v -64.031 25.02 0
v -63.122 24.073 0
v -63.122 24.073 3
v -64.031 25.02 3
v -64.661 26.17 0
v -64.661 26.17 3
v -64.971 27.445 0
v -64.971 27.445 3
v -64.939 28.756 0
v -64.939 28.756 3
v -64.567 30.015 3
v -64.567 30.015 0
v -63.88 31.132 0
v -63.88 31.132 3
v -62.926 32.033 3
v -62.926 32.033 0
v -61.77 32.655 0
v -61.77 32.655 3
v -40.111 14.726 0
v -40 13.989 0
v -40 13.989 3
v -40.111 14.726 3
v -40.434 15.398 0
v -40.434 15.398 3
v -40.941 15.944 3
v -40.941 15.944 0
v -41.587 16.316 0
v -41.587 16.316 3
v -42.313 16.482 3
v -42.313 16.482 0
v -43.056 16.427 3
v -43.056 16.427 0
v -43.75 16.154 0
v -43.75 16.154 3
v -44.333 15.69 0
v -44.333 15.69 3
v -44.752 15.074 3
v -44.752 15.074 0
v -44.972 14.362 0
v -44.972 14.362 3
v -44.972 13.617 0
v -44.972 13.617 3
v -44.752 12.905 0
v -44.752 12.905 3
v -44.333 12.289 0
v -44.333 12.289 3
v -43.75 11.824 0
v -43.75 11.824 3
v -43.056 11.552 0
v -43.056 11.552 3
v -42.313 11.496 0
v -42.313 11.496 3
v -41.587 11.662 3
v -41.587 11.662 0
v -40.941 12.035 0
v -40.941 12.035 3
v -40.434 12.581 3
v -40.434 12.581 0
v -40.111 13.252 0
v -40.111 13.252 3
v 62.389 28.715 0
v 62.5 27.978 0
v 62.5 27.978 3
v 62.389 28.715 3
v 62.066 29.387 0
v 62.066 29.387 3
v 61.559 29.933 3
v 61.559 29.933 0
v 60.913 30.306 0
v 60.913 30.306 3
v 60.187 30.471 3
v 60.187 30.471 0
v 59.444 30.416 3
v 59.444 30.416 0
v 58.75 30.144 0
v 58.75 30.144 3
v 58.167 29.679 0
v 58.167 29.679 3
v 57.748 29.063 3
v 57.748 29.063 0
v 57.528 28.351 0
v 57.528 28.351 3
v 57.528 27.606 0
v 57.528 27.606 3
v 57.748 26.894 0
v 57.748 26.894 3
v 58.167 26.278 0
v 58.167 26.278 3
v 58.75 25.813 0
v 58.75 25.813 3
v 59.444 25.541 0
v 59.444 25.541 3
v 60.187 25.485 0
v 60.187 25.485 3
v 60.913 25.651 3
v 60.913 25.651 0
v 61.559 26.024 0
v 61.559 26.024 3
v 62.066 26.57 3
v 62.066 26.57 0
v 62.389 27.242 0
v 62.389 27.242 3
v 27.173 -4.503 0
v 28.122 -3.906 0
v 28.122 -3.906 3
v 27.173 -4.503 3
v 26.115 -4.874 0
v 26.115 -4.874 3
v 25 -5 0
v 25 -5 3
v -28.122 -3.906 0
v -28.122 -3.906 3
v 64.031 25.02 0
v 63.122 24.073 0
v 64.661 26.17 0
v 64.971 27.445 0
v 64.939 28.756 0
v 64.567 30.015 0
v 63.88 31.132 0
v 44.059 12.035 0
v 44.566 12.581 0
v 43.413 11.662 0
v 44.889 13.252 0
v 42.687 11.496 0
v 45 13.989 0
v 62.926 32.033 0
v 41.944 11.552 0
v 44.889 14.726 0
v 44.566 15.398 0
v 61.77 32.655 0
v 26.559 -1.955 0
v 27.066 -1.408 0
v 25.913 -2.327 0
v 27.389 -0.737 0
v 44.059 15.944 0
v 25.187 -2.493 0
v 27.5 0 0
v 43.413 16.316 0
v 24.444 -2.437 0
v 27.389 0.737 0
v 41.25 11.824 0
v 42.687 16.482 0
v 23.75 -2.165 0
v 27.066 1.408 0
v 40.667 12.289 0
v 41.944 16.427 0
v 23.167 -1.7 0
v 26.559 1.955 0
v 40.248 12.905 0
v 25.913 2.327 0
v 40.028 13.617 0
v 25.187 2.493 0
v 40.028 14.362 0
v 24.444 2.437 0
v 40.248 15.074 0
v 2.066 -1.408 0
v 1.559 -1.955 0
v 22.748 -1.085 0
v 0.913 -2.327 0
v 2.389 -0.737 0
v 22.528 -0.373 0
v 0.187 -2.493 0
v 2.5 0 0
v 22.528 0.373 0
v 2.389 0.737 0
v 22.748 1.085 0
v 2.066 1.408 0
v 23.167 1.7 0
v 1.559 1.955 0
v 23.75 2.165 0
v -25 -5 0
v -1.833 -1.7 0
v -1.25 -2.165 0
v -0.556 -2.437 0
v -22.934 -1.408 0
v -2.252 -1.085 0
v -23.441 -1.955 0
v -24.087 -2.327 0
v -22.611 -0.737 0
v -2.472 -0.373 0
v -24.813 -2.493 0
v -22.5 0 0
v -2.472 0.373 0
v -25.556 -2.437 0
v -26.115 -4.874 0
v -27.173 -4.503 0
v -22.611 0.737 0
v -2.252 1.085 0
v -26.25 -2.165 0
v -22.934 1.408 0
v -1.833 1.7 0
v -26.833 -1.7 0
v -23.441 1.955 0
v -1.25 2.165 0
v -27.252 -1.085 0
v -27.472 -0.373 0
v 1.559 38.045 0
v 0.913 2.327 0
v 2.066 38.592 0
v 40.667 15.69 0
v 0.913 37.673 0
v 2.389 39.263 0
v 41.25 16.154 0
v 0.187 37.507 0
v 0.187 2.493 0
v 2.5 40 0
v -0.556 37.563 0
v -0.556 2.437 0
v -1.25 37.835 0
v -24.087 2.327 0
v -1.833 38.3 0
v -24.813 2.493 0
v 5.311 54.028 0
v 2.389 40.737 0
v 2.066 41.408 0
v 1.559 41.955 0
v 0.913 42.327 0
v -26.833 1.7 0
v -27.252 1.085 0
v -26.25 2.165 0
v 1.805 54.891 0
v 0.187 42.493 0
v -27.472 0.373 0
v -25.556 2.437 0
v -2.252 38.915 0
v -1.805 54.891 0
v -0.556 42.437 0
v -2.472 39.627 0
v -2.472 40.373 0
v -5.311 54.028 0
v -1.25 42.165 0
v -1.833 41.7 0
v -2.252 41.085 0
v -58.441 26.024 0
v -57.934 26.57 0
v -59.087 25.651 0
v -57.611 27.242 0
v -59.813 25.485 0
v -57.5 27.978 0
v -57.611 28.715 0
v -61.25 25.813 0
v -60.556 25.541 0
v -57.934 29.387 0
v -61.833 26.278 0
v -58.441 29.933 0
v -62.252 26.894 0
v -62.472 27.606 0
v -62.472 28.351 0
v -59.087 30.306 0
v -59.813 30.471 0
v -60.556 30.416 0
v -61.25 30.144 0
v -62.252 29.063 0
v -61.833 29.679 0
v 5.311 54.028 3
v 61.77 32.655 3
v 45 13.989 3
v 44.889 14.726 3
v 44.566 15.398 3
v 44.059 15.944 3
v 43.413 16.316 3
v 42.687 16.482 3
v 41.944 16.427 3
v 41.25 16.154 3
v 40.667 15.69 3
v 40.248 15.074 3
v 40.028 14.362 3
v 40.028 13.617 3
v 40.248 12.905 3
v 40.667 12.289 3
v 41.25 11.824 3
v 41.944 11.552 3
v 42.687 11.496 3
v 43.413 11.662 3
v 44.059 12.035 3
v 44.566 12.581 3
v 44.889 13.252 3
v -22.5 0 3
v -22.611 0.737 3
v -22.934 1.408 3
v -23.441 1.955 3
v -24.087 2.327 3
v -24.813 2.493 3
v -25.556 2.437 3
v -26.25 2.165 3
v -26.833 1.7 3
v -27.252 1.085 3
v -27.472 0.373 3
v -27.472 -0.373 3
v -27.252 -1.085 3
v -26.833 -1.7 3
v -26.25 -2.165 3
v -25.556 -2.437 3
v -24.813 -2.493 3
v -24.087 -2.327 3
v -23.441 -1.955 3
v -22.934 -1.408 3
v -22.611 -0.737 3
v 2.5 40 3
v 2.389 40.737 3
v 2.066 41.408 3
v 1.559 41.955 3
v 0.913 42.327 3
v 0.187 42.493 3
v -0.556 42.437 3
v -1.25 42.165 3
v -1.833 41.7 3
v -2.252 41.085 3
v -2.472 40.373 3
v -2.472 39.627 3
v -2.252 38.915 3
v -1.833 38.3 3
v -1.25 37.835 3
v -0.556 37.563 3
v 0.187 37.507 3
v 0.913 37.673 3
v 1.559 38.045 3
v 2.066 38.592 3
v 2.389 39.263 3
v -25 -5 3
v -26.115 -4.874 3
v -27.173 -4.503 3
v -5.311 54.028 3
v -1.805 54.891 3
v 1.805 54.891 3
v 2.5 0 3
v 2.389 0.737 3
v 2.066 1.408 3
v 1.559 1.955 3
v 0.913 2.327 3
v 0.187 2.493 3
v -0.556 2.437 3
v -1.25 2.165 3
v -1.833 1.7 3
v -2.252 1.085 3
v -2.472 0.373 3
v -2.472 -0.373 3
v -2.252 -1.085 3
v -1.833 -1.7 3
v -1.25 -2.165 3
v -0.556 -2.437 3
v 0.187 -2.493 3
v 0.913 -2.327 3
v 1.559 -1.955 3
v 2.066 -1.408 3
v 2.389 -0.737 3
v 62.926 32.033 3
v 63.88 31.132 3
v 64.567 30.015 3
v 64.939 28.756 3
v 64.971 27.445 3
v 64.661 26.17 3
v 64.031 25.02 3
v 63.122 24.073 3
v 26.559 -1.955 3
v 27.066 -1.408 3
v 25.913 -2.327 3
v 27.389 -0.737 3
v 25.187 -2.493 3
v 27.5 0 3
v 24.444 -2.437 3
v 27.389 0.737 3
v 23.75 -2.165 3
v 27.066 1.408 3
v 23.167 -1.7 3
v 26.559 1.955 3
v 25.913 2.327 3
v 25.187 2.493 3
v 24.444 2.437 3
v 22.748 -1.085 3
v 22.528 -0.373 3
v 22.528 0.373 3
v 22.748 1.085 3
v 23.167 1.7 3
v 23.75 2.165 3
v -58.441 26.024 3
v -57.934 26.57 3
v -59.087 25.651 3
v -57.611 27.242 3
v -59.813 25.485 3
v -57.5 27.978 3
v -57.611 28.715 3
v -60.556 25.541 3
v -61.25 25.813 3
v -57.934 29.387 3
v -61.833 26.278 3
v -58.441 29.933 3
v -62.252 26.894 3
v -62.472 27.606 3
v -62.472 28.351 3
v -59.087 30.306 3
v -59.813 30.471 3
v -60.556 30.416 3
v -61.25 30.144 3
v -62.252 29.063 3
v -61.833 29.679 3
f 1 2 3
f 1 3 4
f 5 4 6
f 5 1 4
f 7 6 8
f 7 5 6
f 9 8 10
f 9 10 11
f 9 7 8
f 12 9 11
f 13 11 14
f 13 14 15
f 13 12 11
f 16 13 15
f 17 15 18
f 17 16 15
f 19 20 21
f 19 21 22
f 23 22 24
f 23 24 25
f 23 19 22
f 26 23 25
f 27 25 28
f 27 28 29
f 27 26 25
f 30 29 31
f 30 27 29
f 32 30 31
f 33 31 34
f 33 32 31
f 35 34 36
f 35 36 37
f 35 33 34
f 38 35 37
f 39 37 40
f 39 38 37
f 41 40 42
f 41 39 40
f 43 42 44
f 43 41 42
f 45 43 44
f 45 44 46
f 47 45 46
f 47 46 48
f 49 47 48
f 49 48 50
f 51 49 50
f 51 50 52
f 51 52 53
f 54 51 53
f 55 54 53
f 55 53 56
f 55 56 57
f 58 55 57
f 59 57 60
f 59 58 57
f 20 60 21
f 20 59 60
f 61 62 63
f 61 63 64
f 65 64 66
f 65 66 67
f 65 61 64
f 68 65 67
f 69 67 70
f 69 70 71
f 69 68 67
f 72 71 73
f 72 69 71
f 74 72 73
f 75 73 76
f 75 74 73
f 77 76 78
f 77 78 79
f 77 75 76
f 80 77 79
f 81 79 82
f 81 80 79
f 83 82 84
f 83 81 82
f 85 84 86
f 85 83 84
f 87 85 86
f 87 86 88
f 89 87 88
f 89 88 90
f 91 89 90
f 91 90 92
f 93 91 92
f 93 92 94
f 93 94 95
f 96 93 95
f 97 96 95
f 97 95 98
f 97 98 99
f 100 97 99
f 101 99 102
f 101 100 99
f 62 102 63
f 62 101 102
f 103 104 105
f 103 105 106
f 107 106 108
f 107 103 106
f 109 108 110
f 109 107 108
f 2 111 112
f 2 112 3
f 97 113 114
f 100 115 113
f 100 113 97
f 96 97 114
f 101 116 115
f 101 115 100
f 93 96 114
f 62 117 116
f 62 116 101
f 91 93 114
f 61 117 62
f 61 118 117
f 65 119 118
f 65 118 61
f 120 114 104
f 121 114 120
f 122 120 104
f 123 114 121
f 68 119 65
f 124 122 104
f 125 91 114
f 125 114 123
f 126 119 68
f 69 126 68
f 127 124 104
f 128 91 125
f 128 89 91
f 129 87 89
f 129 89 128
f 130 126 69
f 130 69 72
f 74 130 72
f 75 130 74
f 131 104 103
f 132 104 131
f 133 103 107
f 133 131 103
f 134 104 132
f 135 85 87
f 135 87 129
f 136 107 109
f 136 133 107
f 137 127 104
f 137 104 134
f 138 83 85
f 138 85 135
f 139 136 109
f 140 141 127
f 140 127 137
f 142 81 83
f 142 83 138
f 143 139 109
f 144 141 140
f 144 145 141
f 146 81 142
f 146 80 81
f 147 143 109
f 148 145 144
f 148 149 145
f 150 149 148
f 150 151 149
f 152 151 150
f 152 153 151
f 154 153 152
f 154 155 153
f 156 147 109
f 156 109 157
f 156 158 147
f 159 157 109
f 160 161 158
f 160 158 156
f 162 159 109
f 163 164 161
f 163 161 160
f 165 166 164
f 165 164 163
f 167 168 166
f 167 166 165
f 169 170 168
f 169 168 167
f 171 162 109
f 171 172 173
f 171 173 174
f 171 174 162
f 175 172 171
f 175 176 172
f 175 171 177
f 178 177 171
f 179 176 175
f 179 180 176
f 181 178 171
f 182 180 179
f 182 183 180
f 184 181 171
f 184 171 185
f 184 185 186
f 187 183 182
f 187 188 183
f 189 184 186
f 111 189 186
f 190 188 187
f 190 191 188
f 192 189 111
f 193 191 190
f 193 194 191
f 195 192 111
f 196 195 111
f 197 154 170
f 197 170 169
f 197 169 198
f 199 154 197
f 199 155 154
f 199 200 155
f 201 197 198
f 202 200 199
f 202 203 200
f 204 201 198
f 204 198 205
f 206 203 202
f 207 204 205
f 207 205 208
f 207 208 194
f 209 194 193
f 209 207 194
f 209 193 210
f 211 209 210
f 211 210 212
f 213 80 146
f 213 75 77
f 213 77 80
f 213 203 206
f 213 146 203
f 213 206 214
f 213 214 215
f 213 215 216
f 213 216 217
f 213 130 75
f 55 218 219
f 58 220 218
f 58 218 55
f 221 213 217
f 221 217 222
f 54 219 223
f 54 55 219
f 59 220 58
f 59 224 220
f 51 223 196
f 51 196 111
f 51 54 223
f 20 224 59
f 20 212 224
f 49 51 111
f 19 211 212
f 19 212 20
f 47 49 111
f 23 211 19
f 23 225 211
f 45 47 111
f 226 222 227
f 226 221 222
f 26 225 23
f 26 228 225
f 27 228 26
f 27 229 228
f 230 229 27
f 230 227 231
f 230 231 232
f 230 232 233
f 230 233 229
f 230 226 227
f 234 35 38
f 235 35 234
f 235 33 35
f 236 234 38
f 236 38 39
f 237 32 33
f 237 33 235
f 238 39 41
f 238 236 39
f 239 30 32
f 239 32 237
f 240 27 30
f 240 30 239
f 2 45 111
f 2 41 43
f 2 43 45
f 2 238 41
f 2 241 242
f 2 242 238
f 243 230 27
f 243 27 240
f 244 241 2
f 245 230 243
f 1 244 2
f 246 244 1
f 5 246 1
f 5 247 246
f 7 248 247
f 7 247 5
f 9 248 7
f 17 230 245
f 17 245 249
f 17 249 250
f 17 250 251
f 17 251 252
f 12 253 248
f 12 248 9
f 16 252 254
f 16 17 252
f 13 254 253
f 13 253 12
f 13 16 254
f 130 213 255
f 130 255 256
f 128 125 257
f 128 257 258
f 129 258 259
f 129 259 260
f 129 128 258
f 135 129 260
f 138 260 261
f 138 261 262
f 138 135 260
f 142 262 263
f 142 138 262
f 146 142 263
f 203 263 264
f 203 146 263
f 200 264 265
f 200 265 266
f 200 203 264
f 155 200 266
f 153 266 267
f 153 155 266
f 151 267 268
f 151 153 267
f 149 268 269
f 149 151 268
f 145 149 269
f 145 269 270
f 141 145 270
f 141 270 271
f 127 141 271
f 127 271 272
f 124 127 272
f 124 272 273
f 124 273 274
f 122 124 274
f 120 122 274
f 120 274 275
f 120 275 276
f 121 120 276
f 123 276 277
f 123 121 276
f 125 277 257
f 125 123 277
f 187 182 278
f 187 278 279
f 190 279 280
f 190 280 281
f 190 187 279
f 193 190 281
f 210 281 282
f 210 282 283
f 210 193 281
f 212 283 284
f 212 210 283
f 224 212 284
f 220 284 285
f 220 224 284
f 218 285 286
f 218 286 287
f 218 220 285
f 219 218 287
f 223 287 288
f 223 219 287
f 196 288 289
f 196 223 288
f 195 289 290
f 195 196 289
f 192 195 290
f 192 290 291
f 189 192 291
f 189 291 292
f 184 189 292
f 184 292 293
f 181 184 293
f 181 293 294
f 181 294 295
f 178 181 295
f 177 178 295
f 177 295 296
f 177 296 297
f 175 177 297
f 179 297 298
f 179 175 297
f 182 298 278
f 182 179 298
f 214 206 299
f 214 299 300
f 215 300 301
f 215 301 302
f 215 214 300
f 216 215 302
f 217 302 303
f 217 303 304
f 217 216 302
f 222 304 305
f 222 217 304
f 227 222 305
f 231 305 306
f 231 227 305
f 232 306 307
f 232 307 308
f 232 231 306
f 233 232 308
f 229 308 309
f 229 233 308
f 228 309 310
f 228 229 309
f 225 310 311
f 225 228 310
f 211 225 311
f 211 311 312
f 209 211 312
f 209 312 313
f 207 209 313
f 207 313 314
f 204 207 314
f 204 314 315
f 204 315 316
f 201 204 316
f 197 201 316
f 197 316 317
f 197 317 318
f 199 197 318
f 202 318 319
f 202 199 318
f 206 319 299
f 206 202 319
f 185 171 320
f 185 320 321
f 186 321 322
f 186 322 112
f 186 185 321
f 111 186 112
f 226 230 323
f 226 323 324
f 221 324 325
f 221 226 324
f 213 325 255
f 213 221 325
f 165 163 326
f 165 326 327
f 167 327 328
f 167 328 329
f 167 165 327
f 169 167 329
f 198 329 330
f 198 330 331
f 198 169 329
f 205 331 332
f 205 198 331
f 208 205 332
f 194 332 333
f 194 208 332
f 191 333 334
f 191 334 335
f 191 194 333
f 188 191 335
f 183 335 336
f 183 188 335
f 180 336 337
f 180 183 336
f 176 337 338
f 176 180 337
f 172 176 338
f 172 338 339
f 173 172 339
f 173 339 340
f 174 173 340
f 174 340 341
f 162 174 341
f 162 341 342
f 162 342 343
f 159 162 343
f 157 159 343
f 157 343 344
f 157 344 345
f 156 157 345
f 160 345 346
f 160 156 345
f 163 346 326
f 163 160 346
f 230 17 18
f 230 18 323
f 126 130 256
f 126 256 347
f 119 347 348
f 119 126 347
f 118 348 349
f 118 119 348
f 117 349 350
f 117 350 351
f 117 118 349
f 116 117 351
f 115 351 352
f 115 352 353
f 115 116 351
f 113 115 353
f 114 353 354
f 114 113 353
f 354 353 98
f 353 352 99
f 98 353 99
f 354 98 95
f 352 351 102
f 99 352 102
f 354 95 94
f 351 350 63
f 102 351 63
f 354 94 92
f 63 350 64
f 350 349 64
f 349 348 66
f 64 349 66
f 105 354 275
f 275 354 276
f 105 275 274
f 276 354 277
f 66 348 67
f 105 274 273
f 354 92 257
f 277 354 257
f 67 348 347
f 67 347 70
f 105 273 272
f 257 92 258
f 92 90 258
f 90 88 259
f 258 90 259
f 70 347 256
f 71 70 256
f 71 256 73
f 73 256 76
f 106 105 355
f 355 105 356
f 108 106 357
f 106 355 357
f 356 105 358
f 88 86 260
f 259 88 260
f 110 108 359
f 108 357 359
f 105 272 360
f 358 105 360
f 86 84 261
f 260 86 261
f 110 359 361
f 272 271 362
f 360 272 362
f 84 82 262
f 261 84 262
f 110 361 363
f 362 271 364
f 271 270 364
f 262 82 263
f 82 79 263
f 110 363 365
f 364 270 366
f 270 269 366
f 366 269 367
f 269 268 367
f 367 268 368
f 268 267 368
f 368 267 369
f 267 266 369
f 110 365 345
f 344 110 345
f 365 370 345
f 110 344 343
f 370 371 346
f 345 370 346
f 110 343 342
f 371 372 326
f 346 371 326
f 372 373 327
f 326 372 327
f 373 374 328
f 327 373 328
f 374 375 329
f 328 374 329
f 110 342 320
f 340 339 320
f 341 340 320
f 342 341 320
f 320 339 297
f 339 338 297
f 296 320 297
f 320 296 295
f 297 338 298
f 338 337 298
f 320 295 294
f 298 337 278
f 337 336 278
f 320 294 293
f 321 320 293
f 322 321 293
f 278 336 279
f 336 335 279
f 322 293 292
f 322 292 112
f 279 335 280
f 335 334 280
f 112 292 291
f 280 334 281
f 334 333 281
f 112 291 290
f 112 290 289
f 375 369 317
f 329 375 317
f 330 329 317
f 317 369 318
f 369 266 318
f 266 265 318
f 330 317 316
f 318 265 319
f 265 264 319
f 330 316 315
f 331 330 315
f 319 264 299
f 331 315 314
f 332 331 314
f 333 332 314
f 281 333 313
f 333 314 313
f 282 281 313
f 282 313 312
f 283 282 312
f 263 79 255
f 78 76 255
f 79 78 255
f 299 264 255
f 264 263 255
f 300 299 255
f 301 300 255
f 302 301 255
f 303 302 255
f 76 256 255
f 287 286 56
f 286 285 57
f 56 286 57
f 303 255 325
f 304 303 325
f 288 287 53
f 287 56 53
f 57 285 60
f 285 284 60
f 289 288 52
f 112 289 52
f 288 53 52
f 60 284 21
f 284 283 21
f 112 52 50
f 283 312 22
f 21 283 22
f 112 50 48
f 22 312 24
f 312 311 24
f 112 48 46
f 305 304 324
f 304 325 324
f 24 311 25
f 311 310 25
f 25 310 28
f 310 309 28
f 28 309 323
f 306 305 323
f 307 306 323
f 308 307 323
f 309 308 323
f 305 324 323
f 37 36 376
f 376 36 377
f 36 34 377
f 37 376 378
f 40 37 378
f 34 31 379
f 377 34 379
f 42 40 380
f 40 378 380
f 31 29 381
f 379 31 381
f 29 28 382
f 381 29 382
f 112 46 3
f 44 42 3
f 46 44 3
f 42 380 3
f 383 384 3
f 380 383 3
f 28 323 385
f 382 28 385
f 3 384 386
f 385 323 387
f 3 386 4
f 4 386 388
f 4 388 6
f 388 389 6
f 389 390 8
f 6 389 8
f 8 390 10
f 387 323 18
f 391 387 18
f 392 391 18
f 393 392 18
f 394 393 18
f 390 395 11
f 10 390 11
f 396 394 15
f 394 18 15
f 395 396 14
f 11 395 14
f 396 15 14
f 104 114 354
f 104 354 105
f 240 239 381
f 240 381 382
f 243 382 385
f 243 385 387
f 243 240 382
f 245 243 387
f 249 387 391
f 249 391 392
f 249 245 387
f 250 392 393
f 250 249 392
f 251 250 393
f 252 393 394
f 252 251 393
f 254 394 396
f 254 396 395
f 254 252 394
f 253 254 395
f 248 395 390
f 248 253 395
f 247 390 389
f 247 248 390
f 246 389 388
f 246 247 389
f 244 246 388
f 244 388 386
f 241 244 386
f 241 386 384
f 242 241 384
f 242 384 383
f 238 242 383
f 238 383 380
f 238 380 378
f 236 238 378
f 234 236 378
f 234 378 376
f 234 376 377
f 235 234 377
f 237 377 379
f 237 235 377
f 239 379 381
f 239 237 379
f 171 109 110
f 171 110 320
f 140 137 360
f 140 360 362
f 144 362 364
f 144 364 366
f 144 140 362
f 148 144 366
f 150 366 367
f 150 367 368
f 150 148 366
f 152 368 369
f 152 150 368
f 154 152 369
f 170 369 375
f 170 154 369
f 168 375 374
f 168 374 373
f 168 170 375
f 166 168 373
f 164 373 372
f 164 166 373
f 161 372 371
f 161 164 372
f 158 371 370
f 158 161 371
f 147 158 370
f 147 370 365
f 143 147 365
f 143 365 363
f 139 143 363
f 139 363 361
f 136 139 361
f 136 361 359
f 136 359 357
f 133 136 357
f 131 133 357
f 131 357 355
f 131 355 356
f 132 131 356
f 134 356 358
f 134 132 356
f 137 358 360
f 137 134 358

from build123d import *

# Parameters (mm, degrees)
SKETCH2_R           = 2.5
BOSS_EXTRUDE1_DEPTH = 3


with BuildPart() as part:
    # Sketch2 → Boss-Extrude1 (new body)
    with BuildSketch(Plane.XY):
        with BuildLine():
            Line((-61.770239404, 32.654595977), (-5.310718211, 54.028409464))
            ThreePointArc((-5.310718211, 54.028409464), (0, 55), (5.310718211, 54.028409464))
            Line((5.310718211, 54.028409464), (61.770239404, 32.654595977))
            ThreePointArc((61.770239404, 32.654595977), (64.939100687, 28.75645975), (63.122009394, 24.072943218))
            Line((63.122009394, 24.072943218), (28.122009394, -3.905516271))
            ThreePointArc((28.122009394, -3.905516271), (26.654149123, -4.718452149), (25, -5))
            Line((25, -5), (0, -5))
            Line((0, -5), (-25, -5))
            ThreePointArc((-25, -5), (-26.654149123, -4.718452149), (-28.122009394, -3.905516271))
            Line((-28.122009394, -3.905516271), (-63.122009394, 24.072943218))
            ThreePointArc((-63.122009394, 24.072943218), (-64.939100687, 28.75645975), (-61.770239404, 32.654595977))
        make_face()
        with Locations((-60, 27.978459489)):
            Circle(SKETCH2_R, mode=Mode.SUBTRACT)
        with Locations((0, 40)):
            Circle(SKETCH2_R, mode=Mode.SUBTRACT)
        with Locations((60, 27.978459489)):
            Circle(SKETCH2_R, mode=Mode.SUBTRACT)
        with Locations((25, 0)):
            Circle(SKETCH2_R, mode=Mode.SUBTRACT)
        Circle(SKETCH2_R, mode=Mode.SUBTRACT)
        with Locations((-25, 0)):
            Circle(SKETCH2_R, mode=Mode.SUBTRACT)
        with Locations((-42.5, 13.989229745)):
            Circle(SKETCH2_R, mode=Mode.SUBTRACT)
        with Locations((42.5, 13.989229745)):
            Circle(SKETCH2_R, mode=Mode.SUBTRACT)
    extrude(amount=BOSS_EXTRUDE1_DEPTH)


solid = part.part
